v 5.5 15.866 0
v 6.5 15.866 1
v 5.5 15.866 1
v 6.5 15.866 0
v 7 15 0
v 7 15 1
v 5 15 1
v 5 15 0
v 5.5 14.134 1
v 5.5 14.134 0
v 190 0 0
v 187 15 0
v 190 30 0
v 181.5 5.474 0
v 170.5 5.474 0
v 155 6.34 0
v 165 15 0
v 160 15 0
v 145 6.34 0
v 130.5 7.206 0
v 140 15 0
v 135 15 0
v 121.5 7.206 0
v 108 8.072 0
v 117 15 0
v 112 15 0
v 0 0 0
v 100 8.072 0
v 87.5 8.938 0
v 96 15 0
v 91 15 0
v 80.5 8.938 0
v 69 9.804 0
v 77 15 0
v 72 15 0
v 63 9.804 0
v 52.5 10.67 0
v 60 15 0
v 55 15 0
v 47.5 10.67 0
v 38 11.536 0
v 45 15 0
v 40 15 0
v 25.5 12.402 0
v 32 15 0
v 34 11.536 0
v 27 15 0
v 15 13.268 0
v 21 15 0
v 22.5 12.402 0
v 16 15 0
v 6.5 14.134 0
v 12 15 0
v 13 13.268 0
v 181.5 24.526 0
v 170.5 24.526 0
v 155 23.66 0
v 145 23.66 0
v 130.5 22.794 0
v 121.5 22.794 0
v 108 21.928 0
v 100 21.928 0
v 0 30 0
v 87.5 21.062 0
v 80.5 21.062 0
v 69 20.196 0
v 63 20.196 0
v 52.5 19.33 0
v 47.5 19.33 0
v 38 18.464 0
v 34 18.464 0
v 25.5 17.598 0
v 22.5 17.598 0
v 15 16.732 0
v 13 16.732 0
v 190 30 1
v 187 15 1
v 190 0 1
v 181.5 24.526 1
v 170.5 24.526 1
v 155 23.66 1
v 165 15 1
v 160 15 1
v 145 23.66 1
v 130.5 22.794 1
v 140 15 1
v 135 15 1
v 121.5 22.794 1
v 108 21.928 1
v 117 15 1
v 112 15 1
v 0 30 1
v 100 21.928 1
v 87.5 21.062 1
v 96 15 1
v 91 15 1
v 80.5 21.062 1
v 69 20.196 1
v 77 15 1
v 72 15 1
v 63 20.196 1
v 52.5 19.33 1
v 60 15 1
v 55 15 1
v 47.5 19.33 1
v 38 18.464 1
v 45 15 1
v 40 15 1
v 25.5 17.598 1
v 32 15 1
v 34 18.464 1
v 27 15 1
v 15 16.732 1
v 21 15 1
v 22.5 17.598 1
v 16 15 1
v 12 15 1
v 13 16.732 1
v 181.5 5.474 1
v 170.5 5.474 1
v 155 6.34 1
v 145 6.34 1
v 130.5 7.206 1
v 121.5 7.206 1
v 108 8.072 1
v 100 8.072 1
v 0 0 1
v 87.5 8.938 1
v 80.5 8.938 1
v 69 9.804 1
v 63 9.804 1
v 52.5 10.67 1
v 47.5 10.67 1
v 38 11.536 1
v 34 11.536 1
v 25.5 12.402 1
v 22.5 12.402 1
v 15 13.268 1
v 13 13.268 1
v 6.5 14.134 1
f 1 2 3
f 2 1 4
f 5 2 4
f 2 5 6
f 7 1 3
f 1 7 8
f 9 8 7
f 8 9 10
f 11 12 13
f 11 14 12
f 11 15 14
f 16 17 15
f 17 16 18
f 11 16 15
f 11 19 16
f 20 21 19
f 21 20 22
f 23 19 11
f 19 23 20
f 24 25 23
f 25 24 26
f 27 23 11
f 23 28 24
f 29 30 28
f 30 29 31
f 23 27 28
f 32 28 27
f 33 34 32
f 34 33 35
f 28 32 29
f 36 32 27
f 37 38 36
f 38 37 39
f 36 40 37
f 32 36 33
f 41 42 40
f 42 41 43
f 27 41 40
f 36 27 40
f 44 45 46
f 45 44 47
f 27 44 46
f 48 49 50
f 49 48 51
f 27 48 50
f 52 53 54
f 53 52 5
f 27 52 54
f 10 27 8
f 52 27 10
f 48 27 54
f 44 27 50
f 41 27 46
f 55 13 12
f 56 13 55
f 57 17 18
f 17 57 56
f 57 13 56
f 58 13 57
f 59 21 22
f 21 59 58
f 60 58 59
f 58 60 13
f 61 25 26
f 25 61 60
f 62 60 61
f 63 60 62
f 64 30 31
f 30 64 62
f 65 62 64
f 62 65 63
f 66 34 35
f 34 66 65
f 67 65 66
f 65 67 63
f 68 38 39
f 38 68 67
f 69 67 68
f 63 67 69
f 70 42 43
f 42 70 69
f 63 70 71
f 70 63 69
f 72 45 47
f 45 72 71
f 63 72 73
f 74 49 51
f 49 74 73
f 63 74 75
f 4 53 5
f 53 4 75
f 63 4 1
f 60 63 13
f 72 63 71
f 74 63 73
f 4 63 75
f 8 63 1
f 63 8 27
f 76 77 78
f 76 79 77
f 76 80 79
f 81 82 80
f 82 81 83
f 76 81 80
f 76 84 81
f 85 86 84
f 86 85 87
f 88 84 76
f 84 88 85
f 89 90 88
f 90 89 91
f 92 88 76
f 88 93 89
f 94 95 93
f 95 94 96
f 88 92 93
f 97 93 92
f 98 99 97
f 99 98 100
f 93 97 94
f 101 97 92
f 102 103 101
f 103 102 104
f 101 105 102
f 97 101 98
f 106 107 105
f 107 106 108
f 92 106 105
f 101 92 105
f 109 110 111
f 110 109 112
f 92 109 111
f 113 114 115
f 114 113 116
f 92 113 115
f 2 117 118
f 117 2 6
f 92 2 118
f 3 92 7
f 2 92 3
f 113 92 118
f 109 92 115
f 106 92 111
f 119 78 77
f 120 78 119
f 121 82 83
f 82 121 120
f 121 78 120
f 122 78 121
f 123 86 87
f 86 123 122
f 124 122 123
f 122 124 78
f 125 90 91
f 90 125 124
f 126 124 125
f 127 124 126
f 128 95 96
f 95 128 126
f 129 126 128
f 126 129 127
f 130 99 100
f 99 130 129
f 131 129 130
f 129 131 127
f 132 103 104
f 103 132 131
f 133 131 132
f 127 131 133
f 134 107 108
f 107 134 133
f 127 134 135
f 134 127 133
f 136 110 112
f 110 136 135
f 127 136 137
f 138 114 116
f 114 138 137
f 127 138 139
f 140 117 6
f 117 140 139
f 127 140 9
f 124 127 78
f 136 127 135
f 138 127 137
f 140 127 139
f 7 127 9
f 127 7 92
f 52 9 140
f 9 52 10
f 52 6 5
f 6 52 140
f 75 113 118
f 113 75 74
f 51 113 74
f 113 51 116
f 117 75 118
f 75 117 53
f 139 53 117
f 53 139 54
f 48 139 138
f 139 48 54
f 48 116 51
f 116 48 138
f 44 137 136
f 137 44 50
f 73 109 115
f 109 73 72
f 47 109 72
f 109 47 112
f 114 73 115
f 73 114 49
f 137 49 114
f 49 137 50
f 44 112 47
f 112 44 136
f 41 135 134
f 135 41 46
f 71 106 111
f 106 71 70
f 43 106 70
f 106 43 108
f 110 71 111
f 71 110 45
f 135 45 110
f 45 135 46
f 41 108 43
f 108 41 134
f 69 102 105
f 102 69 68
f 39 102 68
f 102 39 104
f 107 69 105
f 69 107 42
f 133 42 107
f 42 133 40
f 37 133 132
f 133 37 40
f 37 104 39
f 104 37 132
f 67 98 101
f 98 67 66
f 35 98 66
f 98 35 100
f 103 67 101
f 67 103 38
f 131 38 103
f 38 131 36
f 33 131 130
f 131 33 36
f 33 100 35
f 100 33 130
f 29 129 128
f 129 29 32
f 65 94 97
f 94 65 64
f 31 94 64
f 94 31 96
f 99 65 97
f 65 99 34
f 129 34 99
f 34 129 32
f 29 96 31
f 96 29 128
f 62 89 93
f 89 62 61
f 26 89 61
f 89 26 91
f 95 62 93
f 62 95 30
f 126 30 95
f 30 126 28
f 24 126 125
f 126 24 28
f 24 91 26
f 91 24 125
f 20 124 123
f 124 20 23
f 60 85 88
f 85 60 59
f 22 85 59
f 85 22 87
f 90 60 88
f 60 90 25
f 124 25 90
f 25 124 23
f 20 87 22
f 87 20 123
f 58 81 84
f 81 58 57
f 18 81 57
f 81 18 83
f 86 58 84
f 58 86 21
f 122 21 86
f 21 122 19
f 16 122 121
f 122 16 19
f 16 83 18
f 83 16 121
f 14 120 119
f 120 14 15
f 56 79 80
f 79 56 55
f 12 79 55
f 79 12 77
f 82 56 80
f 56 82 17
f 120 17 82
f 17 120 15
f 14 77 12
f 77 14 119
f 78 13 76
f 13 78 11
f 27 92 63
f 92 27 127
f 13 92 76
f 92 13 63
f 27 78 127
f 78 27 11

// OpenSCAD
h = 1;
gap = 5;

difference() {
    cube([190, 30, h]);
    for (i=[0:11]) {
        translate([i*i + gap * i, 15, 0])
            cylinder(h=h, r1=i, r2=i, $fn=6);
    }
}
